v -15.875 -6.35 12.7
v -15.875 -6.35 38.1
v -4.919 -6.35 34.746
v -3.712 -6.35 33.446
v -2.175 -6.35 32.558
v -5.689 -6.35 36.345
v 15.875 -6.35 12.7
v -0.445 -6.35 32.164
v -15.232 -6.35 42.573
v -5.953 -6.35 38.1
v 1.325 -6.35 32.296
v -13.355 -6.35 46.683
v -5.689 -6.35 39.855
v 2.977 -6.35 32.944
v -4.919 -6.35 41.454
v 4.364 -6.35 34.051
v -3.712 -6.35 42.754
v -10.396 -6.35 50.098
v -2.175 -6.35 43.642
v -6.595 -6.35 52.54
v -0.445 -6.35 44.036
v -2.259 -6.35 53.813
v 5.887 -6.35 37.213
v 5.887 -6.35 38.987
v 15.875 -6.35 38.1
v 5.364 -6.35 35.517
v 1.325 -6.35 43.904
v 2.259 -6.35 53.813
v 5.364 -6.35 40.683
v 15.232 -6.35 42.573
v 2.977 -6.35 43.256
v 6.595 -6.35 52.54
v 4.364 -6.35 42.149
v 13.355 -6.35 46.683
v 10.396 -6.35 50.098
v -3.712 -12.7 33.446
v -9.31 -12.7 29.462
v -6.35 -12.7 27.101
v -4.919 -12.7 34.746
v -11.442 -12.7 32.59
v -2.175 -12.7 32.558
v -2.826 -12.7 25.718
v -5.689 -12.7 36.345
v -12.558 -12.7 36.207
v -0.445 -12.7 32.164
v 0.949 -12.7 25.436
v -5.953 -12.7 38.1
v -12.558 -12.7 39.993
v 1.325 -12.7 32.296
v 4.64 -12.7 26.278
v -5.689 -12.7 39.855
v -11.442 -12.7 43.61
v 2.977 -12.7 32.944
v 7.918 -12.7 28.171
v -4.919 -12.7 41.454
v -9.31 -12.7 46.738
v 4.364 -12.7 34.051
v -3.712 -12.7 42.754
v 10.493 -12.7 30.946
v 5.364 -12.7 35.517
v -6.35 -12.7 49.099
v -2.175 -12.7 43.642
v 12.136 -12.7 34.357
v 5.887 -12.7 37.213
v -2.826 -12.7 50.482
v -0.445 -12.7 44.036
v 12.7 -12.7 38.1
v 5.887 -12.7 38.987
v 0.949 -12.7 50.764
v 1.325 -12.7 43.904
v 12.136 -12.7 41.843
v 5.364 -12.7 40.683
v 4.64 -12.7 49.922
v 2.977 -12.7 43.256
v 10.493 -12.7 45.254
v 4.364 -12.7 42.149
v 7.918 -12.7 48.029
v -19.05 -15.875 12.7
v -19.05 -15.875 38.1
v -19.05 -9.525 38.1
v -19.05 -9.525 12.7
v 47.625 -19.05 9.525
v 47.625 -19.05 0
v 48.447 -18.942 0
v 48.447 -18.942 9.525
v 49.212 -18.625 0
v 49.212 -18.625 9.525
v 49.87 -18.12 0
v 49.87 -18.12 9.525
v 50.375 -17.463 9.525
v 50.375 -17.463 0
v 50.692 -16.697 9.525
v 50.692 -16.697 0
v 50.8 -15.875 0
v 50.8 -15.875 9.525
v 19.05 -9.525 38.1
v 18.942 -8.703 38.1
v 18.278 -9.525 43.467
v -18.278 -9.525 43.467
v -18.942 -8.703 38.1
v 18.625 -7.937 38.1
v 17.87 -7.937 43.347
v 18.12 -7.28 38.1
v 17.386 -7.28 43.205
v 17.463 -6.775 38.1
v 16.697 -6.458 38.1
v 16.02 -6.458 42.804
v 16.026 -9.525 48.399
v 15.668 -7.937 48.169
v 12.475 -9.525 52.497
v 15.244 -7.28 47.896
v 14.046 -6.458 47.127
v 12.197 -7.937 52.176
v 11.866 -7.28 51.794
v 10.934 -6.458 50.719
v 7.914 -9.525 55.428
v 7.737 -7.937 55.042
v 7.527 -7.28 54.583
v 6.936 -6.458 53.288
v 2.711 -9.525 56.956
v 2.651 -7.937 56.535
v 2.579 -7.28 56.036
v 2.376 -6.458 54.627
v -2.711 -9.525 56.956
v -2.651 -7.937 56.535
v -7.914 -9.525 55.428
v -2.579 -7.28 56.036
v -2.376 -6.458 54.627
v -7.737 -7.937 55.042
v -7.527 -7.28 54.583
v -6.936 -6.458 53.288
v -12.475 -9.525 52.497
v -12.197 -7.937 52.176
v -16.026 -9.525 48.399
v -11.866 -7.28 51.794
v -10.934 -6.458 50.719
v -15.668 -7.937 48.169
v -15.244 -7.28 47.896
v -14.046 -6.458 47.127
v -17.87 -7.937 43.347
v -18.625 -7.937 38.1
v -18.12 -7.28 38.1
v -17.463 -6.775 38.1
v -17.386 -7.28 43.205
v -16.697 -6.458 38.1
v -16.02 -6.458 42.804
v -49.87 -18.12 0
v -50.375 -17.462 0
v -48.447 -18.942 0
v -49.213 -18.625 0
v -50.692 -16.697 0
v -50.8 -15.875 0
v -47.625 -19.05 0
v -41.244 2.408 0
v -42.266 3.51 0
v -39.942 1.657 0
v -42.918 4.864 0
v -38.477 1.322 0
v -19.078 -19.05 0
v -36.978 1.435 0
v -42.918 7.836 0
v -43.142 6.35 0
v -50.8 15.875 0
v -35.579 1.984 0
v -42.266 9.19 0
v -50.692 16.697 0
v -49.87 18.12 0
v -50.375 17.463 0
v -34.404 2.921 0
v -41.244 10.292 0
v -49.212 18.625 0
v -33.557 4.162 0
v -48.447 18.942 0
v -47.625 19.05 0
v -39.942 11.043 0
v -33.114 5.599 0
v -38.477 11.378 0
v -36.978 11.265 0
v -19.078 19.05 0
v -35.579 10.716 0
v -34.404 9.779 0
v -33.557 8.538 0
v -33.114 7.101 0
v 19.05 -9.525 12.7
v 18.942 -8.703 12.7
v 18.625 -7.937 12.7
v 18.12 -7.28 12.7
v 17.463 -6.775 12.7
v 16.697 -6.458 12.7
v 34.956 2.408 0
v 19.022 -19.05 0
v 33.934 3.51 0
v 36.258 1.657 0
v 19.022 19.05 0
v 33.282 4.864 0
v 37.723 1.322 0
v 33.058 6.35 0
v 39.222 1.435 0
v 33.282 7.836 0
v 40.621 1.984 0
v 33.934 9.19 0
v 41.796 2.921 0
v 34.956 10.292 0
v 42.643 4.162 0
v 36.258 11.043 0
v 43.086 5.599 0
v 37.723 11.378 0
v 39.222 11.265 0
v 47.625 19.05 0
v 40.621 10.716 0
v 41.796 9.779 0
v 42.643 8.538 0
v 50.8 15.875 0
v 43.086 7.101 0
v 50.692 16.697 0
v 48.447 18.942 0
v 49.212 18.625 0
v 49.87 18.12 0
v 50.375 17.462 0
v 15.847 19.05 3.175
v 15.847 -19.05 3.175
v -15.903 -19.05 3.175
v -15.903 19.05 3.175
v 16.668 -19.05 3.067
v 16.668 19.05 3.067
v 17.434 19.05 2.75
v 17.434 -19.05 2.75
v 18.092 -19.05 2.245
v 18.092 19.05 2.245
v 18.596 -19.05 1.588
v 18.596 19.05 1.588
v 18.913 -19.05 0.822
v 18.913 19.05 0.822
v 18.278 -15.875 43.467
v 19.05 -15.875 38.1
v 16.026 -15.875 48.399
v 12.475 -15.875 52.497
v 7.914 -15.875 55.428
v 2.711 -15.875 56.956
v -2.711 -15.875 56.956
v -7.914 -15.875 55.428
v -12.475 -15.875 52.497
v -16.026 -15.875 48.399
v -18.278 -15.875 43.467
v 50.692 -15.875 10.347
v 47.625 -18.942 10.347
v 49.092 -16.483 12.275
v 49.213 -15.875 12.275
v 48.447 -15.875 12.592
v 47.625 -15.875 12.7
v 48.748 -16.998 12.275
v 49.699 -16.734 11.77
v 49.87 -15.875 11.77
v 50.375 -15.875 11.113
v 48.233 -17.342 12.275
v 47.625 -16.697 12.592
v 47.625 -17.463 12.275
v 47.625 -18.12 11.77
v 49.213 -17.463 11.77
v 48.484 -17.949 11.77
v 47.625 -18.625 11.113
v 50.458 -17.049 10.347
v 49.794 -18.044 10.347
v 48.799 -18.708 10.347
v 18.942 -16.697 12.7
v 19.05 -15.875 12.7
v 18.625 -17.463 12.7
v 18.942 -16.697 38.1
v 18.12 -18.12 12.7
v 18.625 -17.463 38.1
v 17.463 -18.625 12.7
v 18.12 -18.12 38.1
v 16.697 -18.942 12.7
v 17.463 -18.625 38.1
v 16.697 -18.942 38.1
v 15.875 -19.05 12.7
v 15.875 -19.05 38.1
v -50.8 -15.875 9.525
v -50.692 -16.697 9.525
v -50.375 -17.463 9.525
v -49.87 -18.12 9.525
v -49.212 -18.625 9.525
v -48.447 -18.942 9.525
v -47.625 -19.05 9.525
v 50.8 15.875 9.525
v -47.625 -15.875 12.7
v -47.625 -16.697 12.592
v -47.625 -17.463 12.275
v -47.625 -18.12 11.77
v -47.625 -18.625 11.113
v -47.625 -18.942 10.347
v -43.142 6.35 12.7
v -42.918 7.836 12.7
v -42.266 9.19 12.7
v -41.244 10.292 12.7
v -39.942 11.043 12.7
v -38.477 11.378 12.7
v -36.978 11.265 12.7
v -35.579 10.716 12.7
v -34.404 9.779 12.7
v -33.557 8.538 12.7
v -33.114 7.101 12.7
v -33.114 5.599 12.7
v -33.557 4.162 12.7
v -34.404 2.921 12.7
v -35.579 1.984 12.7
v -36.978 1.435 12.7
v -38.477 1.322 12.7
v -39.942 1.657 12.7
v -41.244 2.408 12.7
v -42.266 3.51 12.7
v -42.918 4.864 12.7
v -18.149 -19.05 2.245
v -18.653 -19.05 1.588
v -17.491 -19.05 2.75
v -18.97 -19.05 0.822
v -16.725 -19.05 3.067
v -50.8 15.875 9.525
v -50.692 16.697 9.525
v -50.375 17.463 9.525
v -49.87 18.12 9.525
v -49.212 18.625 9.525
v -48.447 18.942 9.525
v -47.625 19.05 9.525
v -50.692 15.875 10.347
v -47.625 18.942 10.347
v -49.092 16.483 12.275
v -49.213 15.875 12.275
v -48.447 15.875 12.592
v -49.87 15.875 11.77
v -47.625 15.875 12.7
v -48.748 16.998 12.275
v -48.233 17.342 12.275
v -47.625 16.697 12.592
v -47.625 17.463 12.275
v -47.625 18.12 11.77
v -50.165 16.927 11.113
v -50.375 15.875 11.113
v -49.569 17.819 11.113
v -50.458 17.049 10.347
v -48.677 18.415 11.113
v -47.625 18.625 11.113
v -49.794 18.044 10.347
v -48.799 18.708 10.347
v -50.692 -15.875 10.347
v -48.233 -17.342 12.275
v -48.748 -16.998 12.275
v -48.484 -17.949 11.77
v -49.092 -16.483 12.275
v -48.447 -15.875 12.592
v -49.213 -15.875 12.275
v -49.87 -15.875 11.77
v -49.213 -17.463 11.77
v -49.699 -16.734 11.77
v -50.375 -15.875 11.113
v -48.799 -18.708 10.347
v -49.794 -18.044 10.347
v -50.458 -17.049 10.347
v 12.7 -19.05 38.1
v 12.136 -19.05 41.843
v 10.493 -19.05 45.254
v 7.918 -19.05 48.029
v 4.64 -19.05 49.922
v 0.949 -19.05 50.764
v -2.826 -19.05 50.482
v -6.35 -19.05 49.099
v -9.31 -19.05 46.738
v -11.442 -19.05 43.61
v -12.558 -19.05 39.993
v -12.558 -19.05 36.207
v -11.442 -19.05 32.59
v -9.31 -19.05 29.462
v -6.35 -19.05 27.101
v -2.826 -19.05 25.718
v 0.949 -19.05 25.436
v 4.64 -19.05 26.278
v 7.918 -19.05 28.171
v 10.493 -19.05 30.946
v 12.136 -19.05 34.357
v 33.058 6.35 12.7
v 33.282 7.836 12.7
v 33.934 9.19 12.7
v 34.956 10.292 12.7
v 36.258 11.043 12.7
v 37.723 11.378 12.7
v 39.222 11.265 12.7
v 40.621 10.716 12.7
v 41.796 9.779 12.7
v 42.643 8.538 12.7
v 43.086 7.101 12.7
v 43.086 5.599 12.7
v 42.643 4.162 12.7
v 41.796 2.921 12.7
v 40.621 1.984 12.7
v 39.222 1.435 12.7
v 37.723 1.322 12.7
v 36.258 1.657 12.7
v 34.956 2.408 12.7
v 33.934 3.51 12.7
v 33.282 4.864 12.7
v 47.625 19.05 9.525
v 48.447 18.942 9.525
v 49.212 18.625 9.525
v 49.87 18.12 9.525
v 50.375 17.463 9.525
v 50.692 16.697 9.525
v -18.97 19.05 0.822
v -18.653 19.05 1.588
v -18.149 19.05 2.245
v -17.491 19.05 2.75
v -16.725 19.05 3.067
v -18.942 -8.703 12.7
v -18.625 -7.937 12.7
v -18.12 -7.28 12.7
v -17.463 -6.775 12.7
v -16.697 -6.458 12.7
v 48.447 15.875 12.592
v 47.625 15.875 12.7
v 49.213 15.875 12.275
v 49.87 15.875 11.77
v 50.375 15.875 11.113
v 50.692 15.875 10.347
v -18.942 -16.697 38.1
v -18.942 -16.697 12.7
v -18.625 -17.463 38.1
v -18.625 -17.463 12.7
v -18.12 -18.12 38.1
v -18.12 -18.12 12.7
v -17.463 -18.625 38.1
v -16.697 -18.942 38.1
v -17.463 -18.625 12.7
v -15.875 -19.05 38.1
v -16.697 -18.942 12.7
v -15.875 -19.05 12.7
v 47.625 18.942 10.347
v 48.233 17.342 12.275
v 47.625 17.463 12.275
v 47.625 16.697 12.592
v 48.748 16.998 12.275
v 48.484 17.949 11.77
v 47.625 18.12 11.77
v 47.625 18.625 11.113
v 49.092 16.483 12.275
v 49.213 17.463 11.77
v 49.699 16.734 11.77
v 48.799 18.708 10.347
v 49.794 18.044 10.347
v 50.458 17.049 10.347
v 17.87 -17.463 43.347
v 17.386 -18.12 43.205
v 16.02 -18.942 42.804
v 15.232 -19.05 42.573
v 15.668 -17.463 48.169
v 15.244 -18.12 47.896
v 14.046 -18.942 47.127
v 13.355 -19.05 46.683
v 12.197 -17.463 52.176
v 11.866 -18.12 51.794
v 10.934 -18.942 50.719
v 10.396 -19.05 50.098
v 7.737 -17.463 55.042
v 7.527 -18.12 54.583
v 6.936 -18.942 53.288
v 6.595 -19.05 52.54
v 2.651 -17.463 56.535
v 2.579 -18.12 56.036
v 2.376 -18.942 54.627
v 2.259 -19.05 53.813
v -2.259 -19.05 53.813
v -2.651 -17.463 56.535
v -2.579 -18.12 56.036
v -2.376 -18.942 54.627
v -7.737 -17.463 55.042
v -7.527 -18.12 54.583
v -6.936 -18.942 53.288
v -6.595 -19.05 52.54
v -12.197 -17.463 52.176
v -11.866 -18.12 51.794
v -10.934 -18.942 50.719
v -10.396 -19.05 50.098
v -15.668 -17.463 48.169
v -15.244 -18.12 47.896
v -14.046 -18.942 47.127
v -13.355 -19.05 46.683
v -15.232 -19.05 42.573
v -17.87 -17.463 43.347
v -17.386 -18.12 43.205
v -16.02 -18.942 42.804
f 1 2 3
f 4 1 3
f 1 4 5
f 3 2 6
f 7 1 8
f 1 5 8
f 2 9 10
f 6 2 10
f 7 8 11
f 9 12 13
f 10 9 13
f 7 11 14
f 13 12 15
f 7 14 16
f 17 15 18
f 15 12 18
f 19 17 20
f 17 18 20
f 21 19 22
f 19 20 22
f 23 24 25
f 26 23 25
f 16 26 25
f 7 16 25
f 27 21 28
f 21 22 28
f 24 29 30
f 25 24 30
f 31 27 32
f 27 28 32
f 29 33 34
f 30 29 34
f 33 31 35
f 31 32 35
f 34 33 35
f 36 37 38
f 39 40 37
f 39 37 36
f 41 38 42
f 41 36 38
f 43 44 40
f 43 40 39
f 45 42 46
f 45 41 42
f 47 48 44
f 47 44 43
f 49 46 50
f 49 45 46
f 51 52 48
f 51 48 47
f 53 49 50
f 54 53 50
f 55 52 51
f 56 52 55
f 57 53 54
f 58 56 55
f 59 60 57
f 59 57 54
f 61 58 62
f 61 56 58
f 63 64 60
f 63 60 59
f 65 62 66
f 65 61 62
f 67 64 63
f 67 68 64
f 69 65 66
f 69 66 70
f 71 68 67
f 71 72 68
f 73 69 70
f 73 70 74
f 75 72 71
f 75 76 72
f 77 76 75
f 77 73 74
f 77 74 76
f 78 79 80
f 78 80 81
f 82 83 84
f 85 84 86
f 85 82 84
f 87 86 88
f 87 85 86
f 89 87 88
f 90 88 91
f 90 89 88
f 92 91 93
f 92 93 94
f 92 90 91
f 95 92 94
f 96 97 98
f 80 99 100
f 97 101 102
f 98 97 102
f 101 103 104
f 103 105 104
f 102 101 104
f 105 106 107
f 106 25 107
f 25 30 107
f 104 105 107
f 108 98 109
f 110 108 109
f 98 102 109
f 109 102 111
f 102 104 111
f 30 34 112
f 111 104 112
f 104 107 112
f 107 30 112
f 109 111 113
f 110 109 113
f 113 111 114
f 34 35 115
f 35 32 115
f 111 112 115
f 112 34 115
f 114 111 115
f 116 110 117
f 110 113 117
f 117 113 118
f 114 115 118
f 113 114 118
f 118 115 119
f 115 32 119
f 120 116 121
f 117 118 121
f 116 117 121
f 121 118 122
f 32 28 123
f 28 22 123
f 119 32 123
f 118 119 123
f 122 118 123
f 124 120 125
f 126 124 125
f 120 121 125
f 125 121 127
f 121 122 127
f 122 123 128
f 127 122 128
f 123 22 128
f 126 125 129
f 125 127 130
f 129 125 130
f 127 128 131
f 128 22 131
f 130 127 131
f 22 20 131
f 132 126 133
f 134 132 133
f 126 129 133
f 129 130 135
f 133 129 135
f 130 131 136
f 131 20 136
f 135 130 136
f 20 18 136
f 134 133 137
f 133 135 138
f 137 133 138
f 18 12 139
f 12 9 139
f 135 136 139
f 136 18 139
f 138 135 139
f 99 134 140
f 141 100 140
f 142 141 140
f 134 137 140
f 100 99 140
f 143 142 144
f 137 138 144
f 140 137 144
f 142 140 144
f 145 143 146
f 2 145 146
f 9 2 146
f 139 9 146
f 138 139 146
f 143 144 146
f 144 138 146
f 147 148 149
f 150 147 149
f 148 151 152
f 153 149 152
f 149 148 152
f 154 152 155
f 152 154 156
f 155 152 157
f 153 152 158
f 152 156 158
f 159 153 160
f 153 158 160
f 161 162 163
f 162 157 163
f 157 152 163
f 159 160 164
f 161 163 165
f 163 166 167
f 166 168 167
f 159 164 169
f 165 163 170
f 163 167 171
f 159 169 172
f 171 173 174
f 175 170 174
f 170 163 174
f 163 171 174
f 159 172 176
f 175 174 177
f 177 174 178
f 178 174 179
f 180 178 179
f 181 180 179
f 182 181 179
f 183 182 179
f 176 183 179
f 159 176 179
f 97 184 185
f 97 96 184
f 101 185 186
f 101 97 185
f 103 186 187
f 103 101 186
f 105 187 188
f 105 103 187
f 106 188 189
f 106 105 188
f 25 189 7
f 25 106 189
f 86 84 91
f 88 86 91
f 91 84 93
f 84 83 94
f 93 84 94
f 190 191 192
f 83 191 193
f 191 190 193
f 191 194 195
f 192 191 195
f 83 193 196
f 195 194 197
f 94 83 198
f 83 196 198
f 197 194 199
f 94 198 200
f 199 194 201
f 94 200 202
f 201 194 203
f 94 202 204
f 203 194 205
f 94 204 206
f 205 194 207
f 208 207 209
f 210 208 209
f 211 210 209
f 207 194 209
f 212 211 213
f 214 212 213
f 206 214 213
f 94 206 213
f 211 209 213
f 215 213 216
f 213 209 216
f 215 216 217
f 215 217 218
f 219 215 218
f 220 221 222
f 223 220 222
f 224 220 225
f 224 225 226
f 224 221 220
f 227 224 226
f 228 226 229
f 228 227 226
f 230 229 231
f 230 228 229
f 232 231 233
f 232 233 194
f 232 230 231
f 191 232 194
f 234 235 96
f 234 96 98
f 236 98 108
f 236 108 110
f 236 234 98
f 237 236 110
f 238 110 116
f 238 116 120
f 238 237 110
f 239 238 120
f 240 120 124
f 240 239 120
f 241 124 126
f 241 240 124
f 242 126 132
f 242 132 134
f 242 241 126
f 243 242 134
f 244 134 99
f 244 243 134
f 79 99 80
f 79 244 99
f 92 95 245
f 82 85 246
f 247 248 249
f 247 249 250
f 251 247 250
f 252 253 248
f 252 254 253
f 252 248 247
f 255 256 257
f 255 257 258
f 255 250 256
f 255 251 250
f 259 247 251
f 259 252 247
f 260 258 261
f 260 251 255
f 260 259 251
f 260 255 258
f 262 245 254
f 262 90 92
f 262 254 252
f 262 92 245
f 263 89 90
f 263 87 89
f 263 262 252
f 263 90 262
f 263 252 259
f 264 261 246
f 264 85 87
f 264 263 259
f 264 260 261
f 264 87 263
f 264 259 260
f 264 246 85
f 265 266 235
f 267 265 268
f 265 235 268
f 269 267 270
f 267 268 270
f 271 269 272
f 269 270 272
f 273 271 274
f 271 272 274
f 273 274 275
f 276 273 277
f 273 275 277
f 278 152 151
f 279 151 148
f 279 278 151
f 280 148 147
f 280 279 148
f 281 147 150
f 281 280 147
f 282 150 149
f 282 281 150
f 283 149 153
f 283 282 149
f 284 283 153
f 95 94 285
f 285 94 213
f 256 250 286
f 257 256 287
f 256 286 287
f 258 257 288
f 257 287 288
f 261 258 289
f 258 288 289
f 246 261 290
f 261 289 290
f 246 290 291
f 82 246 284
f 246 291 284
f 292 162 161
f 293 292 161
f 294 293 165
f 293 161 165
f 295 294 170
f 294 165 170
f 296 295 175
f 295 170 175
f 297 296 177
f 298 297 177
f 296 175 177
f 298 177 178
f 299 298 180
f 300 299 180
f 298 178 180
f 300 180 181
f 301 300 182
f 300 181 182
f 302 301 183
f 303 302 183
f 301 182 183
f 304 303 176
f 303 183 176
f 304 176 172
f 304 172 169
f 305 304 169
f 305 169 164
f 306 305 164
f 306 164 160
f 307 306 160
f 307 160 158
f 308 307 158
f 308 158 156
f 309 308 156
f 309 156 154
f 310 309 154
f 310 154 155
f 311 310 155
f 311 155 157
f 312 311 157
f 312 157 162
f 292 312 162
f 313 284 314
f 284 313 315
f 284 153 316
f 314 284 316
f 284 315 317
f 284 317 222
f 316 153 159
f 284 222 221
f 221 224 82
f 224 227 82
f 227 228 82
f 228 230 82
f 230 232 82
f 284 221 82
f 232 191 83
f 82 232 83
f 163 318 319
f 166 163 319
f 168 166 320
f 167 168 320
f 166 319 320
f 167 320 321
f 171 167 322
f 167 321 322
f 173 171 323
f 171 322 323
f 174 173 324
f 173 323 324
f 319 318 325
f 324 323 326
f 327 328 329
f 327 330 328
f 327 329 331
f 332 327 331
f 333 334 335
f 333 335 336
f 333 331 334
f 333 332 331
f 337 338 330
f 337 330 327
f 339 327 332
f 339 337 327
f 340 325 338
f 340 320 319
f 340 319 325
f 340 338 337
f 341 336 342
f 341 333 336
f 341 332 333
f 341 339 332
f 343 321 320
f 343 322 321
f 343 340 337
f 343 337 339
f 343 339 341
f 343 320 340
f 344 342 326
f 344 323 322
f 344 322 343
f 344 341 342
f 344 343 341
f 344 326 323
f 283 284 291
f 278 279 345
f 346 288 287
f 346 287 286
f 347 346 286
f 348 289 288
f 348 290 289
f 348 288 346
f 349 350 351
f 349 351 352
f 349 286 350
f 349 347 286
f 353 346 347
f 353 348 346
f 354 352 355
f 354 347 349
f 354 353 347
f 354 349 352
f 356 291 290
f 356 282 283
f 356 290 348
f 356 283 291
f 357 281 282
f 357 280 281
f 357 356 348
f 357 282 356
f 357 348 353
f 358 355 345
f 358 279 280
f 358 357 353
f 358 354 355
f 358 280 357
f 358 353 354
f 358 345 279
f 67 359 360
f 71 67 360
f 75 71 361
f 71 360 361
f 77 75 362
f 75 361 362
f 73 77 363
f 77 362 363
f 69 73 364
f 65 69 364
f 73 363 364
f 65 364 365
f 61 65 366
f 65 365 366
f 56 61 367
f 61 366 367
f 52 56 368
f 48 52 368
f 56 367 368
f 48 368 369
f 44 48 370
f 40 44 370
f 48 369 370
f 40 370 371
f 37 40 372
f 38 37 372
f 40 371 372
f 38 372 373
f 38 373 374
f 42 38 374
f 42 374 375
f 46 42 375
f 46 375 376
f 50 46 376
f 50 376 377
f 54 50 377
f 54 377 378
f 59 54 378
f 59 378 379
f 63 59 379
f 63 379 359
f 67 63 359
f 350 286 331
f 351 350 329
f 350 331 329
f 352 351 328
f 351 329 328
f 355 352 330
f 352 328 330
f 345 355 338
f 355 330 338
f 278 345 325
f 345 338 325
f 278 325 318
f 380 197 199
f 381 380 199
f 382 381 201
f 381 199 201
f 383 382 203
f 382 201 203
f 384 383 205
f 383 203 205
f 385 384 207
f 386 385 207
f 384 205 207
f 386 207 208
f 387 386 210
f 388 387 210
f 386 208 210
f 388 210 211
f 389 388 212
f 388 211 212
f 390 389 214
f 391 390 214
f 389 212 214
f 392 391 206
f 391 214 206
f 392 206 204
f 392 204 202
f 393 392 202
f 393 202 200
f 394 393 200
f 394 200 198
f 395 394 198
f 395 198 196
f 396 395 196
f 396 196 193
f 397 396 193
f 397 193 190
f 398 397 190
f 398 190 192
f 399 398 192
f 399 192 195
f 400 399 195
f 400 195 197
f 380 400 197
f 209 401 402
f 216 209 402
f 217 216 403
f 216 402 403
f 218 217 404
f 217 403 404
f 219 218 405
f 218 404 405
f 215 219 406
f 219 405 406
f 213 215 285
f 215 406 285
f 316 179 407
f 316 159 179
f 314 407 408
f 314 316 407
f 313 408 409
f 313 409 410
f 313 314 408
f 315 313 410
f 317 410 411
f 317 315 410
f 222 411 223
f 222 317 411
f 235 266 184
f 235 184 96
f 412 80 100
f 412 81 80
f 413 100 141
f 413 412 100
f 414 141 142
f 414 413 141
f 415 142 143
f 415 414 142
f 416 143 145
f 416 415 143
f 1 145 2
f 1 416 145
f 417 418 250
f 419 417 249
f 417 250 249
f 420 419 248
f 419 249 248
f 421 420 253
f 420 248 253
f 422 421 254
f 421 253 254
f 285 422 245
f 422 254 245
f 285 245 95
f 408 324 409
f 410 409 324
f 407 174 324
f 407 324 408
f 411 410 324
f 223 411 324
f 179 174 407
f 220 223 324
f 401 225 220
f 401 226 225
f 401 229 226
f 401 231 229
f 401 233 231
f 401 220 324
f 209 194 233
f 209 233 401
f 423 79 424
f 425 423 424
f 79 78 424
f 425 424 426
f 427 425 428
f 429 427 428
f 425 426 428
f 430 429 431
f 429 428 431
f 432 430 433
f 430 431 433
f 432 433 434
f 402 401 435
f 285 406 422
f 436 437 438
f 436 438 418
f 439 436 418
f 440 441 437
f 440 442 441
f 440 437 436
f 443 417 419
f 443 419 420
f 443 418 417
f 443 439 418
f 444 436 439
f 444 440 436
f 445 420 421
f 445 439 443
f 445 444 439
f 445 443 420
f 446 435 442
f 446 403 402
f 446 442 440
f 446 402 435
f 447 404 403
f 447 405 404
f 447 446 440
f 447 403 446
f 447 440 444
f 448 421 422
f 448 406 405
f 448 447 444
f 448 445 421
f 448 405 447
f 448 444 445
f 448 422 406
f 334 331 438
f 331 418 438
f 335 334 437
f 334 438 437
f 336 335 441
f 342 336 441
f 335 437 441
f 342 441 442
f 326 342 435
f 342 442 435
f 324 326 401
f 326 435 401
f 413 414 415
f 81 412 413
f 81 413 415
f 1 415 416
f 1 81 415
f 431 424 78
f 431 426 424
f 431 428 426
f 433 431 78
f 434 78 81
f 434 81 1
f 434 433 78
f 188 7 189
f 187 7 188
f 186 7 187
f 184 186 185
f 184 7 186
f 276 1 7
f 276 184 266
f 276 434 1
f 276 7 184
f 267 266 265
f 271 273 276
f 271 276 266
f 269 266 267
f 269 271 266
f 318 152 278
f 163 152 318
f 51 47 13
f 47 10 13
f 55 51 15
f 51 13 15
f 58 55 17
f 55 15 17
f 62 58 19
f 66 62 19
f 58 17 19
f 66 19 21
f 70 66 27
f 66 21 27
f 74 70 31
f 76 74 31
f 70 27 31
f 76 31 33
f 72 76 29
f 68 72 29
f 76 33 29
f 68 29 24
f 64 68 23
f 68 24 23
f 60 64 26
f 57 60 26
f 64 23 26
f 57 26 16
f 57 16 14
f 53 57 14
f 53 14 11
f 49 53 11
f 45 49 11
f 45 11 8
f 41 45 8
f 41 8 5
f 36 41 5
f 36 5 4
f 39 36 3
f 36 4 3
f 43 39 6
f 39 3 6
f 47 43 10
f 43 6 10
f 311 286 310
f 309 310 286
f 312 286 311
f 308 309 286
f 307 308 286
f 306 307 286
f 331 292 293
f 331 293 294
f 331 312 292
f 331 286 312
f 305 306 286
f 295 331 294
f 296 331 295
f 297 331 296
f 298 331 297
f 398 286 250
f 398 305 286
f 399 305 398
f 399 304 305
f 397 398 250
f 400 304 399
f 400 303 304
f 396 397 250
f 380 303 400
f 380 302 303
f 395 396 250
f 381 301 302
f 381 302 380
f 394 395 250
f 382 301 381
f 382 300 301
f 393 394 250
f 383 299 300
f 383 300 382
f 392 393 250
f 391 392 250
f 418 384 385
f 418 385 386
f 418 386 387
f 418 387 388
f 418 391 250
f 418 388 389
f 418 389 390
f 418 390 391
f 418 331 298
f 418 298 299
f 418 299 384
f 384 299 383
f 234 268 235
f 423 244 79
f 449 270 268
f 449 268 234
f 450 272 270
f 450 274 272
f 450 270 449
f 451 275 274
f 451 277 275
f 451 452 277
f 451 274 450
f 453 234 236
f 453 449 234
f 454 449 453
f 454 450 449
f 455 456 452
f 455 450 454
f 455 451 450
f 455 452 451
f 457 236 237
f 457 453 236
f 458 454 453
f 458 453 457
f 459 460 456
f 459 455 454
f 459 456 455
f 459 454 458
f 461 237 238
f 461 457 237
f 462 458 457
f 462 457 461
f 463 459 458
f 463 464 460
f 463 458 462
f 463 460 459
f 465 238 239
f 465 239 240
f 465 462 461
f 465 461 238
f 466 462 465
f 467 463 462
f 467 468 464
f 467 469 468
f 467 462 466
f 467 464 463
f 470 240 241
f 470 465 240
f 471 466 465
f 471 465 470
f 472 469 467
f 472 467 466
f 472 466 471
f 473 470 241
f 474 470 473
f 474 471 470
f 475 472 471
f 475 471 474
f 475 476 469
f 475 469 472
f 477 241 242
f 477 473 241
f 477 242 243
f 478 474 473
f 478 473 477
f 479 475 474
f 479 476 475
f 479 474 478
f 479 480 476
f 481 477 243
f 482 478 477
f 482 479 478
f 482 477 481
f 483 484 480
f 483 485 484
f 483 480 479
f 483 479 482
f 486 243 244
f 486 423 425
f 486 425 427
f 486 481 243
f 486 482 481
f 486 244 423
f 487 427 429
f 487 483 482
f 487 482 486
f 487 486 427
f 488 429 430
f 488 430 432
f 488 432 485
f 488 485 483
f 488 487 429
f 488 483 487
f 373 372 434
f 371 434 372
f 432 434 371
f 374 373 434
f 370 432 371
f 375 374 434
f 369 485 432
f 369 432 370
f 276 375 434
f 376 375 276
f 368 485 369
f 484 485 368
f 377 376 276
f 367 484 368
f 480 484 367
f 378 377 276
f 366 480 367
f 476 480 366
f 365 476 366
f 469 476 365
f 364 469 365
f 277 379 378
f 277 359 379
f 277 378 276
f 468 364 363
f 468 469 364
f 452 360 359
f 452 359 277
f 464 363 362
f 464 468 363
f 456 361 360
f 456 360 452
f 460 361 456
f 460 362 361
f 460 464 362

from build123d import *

# Parameters (mm, degrees)
F0_W           = 101.6
F0_H           = 38.1
F1_DEPTH       = 12.7
F3_DEPTH       = 12.7
F5_D           = 11.90625
F5_CBORE_D     = 25.4
F5_CBORE_DEPTH = 6.35
F6_W           = 38.1
F6_H           = 3.175
F7_DEPTH       = 38.101
F9_D           = 10.0838
F10_D          = 10.0838
F11_R          = 3.175
F12_R          = 3.17499
F12_2_R        = 3.17499


# Not quite as in the source:
# - a fillet or chamfer is up to 0.001 mm smaller than in the source, because OpenCascade refuses the exact size
# - a length typed as a fraction of an inch, garbled in the dataset ("3 / 203.2 mm" for 3/8 in), is restored


with BuildPart() as f1:
    # F0 (on Top) → F1 (new body)
    with BuildSketch(Plane.XY):
        Rectangle(F0_W, F0_H)
    extrude(amount=F1_DEPTH)

    # F6 (on face) → F7 (cut, through all)
    with BuildSketch(Plane(origin=(0, 19.05, 0), x_dir=(-1, 0, 0), z_dir=(0, 1, 0))):
        with Locations((0.028450042, 1.5875)):
            Rectangle(F6_W, F6_H)
    extrude(amount=-F7_DEPTH, mode=Mode.SUBTRACT)

    # F9 (through all)
    with Locations(Plane.XY.offset(12.7)):
        with Locations((-38.1, 6.35)):
            Hole(F9_D / 2)

    # F10 (through all)
    with Locations(Plane.XY.offset(12.7)):
        with Locations((38.1, 6.35)):
            Hole(F10_D / 2)

    # F11
    f11_edges = [f1.edges().sort_by_distance(p)[0] for p in [
        (50.8, -19.05, 6.35),
        (50.8, 19.05, 6.35),
        (-50.8, -19.05, 6.35),
        (-50.8, 19.05, 6.35),
    ]]
    fillet(f11_edges, radius=F11_R)

    # F12 (radius 3.175 in the source; OpenCascade refuses exactly that, so slightly less here)
    f12_edges = [f1.edges().sort_by_distance(p)[0] for p in [
        (19.02155, 0, 3.175),
        (-19.07845, 0, 3.175),
        (0, 19.05, 12.7),
    ]]
    fillet(f12_edges, radius=F12_R)


with BuildPart() as f3:
    # F2 (on face) → F3 (new body)
    with BuildSketch(Plane.XZ.offset(19.05)):
        with BuildLine():
            Line((-19.05, 38.1), (-19.05, 12.7))
            Line((-19.05, 12.7), (19.05, 12.7))
            Line((19.05, 12.7), (19.05, 38.1))
            ThreePointArc((19.05, 38.1), (0, 57.15), (-19.05, 38.1))
        make_face()
    extrude(amount=-F3_DEPTH)

    # F5 (through all)
    with Locations(Plane.XZ.offset(19.05)):
        with Locations((0, 38.1)):
            CounterBoreHole(F5_D / 2, F5_CBORE_D / 2, F5_CBORE_DEPTH)

    # F12#2 (radius 3.175 in the source; OpenCascade refuses exactly that, so slightly less here)
    f12_2_edges = [f3.edges().sort_by_distance(p)[0] for p in [
        (0, -19.05, 57.15),
        (0, -6.35, 57.15),
        (19.05, -19.05, 25.4),
        (19.05, -6.35, 25.4),
        (-19.05, -19.05, 25.4),
        (-19.05, -6.35, 25.4),
    ]]
    fillet(f12_2_edges, radius=F12_2_R)


solid = Compound([f1.part, f3.part])
